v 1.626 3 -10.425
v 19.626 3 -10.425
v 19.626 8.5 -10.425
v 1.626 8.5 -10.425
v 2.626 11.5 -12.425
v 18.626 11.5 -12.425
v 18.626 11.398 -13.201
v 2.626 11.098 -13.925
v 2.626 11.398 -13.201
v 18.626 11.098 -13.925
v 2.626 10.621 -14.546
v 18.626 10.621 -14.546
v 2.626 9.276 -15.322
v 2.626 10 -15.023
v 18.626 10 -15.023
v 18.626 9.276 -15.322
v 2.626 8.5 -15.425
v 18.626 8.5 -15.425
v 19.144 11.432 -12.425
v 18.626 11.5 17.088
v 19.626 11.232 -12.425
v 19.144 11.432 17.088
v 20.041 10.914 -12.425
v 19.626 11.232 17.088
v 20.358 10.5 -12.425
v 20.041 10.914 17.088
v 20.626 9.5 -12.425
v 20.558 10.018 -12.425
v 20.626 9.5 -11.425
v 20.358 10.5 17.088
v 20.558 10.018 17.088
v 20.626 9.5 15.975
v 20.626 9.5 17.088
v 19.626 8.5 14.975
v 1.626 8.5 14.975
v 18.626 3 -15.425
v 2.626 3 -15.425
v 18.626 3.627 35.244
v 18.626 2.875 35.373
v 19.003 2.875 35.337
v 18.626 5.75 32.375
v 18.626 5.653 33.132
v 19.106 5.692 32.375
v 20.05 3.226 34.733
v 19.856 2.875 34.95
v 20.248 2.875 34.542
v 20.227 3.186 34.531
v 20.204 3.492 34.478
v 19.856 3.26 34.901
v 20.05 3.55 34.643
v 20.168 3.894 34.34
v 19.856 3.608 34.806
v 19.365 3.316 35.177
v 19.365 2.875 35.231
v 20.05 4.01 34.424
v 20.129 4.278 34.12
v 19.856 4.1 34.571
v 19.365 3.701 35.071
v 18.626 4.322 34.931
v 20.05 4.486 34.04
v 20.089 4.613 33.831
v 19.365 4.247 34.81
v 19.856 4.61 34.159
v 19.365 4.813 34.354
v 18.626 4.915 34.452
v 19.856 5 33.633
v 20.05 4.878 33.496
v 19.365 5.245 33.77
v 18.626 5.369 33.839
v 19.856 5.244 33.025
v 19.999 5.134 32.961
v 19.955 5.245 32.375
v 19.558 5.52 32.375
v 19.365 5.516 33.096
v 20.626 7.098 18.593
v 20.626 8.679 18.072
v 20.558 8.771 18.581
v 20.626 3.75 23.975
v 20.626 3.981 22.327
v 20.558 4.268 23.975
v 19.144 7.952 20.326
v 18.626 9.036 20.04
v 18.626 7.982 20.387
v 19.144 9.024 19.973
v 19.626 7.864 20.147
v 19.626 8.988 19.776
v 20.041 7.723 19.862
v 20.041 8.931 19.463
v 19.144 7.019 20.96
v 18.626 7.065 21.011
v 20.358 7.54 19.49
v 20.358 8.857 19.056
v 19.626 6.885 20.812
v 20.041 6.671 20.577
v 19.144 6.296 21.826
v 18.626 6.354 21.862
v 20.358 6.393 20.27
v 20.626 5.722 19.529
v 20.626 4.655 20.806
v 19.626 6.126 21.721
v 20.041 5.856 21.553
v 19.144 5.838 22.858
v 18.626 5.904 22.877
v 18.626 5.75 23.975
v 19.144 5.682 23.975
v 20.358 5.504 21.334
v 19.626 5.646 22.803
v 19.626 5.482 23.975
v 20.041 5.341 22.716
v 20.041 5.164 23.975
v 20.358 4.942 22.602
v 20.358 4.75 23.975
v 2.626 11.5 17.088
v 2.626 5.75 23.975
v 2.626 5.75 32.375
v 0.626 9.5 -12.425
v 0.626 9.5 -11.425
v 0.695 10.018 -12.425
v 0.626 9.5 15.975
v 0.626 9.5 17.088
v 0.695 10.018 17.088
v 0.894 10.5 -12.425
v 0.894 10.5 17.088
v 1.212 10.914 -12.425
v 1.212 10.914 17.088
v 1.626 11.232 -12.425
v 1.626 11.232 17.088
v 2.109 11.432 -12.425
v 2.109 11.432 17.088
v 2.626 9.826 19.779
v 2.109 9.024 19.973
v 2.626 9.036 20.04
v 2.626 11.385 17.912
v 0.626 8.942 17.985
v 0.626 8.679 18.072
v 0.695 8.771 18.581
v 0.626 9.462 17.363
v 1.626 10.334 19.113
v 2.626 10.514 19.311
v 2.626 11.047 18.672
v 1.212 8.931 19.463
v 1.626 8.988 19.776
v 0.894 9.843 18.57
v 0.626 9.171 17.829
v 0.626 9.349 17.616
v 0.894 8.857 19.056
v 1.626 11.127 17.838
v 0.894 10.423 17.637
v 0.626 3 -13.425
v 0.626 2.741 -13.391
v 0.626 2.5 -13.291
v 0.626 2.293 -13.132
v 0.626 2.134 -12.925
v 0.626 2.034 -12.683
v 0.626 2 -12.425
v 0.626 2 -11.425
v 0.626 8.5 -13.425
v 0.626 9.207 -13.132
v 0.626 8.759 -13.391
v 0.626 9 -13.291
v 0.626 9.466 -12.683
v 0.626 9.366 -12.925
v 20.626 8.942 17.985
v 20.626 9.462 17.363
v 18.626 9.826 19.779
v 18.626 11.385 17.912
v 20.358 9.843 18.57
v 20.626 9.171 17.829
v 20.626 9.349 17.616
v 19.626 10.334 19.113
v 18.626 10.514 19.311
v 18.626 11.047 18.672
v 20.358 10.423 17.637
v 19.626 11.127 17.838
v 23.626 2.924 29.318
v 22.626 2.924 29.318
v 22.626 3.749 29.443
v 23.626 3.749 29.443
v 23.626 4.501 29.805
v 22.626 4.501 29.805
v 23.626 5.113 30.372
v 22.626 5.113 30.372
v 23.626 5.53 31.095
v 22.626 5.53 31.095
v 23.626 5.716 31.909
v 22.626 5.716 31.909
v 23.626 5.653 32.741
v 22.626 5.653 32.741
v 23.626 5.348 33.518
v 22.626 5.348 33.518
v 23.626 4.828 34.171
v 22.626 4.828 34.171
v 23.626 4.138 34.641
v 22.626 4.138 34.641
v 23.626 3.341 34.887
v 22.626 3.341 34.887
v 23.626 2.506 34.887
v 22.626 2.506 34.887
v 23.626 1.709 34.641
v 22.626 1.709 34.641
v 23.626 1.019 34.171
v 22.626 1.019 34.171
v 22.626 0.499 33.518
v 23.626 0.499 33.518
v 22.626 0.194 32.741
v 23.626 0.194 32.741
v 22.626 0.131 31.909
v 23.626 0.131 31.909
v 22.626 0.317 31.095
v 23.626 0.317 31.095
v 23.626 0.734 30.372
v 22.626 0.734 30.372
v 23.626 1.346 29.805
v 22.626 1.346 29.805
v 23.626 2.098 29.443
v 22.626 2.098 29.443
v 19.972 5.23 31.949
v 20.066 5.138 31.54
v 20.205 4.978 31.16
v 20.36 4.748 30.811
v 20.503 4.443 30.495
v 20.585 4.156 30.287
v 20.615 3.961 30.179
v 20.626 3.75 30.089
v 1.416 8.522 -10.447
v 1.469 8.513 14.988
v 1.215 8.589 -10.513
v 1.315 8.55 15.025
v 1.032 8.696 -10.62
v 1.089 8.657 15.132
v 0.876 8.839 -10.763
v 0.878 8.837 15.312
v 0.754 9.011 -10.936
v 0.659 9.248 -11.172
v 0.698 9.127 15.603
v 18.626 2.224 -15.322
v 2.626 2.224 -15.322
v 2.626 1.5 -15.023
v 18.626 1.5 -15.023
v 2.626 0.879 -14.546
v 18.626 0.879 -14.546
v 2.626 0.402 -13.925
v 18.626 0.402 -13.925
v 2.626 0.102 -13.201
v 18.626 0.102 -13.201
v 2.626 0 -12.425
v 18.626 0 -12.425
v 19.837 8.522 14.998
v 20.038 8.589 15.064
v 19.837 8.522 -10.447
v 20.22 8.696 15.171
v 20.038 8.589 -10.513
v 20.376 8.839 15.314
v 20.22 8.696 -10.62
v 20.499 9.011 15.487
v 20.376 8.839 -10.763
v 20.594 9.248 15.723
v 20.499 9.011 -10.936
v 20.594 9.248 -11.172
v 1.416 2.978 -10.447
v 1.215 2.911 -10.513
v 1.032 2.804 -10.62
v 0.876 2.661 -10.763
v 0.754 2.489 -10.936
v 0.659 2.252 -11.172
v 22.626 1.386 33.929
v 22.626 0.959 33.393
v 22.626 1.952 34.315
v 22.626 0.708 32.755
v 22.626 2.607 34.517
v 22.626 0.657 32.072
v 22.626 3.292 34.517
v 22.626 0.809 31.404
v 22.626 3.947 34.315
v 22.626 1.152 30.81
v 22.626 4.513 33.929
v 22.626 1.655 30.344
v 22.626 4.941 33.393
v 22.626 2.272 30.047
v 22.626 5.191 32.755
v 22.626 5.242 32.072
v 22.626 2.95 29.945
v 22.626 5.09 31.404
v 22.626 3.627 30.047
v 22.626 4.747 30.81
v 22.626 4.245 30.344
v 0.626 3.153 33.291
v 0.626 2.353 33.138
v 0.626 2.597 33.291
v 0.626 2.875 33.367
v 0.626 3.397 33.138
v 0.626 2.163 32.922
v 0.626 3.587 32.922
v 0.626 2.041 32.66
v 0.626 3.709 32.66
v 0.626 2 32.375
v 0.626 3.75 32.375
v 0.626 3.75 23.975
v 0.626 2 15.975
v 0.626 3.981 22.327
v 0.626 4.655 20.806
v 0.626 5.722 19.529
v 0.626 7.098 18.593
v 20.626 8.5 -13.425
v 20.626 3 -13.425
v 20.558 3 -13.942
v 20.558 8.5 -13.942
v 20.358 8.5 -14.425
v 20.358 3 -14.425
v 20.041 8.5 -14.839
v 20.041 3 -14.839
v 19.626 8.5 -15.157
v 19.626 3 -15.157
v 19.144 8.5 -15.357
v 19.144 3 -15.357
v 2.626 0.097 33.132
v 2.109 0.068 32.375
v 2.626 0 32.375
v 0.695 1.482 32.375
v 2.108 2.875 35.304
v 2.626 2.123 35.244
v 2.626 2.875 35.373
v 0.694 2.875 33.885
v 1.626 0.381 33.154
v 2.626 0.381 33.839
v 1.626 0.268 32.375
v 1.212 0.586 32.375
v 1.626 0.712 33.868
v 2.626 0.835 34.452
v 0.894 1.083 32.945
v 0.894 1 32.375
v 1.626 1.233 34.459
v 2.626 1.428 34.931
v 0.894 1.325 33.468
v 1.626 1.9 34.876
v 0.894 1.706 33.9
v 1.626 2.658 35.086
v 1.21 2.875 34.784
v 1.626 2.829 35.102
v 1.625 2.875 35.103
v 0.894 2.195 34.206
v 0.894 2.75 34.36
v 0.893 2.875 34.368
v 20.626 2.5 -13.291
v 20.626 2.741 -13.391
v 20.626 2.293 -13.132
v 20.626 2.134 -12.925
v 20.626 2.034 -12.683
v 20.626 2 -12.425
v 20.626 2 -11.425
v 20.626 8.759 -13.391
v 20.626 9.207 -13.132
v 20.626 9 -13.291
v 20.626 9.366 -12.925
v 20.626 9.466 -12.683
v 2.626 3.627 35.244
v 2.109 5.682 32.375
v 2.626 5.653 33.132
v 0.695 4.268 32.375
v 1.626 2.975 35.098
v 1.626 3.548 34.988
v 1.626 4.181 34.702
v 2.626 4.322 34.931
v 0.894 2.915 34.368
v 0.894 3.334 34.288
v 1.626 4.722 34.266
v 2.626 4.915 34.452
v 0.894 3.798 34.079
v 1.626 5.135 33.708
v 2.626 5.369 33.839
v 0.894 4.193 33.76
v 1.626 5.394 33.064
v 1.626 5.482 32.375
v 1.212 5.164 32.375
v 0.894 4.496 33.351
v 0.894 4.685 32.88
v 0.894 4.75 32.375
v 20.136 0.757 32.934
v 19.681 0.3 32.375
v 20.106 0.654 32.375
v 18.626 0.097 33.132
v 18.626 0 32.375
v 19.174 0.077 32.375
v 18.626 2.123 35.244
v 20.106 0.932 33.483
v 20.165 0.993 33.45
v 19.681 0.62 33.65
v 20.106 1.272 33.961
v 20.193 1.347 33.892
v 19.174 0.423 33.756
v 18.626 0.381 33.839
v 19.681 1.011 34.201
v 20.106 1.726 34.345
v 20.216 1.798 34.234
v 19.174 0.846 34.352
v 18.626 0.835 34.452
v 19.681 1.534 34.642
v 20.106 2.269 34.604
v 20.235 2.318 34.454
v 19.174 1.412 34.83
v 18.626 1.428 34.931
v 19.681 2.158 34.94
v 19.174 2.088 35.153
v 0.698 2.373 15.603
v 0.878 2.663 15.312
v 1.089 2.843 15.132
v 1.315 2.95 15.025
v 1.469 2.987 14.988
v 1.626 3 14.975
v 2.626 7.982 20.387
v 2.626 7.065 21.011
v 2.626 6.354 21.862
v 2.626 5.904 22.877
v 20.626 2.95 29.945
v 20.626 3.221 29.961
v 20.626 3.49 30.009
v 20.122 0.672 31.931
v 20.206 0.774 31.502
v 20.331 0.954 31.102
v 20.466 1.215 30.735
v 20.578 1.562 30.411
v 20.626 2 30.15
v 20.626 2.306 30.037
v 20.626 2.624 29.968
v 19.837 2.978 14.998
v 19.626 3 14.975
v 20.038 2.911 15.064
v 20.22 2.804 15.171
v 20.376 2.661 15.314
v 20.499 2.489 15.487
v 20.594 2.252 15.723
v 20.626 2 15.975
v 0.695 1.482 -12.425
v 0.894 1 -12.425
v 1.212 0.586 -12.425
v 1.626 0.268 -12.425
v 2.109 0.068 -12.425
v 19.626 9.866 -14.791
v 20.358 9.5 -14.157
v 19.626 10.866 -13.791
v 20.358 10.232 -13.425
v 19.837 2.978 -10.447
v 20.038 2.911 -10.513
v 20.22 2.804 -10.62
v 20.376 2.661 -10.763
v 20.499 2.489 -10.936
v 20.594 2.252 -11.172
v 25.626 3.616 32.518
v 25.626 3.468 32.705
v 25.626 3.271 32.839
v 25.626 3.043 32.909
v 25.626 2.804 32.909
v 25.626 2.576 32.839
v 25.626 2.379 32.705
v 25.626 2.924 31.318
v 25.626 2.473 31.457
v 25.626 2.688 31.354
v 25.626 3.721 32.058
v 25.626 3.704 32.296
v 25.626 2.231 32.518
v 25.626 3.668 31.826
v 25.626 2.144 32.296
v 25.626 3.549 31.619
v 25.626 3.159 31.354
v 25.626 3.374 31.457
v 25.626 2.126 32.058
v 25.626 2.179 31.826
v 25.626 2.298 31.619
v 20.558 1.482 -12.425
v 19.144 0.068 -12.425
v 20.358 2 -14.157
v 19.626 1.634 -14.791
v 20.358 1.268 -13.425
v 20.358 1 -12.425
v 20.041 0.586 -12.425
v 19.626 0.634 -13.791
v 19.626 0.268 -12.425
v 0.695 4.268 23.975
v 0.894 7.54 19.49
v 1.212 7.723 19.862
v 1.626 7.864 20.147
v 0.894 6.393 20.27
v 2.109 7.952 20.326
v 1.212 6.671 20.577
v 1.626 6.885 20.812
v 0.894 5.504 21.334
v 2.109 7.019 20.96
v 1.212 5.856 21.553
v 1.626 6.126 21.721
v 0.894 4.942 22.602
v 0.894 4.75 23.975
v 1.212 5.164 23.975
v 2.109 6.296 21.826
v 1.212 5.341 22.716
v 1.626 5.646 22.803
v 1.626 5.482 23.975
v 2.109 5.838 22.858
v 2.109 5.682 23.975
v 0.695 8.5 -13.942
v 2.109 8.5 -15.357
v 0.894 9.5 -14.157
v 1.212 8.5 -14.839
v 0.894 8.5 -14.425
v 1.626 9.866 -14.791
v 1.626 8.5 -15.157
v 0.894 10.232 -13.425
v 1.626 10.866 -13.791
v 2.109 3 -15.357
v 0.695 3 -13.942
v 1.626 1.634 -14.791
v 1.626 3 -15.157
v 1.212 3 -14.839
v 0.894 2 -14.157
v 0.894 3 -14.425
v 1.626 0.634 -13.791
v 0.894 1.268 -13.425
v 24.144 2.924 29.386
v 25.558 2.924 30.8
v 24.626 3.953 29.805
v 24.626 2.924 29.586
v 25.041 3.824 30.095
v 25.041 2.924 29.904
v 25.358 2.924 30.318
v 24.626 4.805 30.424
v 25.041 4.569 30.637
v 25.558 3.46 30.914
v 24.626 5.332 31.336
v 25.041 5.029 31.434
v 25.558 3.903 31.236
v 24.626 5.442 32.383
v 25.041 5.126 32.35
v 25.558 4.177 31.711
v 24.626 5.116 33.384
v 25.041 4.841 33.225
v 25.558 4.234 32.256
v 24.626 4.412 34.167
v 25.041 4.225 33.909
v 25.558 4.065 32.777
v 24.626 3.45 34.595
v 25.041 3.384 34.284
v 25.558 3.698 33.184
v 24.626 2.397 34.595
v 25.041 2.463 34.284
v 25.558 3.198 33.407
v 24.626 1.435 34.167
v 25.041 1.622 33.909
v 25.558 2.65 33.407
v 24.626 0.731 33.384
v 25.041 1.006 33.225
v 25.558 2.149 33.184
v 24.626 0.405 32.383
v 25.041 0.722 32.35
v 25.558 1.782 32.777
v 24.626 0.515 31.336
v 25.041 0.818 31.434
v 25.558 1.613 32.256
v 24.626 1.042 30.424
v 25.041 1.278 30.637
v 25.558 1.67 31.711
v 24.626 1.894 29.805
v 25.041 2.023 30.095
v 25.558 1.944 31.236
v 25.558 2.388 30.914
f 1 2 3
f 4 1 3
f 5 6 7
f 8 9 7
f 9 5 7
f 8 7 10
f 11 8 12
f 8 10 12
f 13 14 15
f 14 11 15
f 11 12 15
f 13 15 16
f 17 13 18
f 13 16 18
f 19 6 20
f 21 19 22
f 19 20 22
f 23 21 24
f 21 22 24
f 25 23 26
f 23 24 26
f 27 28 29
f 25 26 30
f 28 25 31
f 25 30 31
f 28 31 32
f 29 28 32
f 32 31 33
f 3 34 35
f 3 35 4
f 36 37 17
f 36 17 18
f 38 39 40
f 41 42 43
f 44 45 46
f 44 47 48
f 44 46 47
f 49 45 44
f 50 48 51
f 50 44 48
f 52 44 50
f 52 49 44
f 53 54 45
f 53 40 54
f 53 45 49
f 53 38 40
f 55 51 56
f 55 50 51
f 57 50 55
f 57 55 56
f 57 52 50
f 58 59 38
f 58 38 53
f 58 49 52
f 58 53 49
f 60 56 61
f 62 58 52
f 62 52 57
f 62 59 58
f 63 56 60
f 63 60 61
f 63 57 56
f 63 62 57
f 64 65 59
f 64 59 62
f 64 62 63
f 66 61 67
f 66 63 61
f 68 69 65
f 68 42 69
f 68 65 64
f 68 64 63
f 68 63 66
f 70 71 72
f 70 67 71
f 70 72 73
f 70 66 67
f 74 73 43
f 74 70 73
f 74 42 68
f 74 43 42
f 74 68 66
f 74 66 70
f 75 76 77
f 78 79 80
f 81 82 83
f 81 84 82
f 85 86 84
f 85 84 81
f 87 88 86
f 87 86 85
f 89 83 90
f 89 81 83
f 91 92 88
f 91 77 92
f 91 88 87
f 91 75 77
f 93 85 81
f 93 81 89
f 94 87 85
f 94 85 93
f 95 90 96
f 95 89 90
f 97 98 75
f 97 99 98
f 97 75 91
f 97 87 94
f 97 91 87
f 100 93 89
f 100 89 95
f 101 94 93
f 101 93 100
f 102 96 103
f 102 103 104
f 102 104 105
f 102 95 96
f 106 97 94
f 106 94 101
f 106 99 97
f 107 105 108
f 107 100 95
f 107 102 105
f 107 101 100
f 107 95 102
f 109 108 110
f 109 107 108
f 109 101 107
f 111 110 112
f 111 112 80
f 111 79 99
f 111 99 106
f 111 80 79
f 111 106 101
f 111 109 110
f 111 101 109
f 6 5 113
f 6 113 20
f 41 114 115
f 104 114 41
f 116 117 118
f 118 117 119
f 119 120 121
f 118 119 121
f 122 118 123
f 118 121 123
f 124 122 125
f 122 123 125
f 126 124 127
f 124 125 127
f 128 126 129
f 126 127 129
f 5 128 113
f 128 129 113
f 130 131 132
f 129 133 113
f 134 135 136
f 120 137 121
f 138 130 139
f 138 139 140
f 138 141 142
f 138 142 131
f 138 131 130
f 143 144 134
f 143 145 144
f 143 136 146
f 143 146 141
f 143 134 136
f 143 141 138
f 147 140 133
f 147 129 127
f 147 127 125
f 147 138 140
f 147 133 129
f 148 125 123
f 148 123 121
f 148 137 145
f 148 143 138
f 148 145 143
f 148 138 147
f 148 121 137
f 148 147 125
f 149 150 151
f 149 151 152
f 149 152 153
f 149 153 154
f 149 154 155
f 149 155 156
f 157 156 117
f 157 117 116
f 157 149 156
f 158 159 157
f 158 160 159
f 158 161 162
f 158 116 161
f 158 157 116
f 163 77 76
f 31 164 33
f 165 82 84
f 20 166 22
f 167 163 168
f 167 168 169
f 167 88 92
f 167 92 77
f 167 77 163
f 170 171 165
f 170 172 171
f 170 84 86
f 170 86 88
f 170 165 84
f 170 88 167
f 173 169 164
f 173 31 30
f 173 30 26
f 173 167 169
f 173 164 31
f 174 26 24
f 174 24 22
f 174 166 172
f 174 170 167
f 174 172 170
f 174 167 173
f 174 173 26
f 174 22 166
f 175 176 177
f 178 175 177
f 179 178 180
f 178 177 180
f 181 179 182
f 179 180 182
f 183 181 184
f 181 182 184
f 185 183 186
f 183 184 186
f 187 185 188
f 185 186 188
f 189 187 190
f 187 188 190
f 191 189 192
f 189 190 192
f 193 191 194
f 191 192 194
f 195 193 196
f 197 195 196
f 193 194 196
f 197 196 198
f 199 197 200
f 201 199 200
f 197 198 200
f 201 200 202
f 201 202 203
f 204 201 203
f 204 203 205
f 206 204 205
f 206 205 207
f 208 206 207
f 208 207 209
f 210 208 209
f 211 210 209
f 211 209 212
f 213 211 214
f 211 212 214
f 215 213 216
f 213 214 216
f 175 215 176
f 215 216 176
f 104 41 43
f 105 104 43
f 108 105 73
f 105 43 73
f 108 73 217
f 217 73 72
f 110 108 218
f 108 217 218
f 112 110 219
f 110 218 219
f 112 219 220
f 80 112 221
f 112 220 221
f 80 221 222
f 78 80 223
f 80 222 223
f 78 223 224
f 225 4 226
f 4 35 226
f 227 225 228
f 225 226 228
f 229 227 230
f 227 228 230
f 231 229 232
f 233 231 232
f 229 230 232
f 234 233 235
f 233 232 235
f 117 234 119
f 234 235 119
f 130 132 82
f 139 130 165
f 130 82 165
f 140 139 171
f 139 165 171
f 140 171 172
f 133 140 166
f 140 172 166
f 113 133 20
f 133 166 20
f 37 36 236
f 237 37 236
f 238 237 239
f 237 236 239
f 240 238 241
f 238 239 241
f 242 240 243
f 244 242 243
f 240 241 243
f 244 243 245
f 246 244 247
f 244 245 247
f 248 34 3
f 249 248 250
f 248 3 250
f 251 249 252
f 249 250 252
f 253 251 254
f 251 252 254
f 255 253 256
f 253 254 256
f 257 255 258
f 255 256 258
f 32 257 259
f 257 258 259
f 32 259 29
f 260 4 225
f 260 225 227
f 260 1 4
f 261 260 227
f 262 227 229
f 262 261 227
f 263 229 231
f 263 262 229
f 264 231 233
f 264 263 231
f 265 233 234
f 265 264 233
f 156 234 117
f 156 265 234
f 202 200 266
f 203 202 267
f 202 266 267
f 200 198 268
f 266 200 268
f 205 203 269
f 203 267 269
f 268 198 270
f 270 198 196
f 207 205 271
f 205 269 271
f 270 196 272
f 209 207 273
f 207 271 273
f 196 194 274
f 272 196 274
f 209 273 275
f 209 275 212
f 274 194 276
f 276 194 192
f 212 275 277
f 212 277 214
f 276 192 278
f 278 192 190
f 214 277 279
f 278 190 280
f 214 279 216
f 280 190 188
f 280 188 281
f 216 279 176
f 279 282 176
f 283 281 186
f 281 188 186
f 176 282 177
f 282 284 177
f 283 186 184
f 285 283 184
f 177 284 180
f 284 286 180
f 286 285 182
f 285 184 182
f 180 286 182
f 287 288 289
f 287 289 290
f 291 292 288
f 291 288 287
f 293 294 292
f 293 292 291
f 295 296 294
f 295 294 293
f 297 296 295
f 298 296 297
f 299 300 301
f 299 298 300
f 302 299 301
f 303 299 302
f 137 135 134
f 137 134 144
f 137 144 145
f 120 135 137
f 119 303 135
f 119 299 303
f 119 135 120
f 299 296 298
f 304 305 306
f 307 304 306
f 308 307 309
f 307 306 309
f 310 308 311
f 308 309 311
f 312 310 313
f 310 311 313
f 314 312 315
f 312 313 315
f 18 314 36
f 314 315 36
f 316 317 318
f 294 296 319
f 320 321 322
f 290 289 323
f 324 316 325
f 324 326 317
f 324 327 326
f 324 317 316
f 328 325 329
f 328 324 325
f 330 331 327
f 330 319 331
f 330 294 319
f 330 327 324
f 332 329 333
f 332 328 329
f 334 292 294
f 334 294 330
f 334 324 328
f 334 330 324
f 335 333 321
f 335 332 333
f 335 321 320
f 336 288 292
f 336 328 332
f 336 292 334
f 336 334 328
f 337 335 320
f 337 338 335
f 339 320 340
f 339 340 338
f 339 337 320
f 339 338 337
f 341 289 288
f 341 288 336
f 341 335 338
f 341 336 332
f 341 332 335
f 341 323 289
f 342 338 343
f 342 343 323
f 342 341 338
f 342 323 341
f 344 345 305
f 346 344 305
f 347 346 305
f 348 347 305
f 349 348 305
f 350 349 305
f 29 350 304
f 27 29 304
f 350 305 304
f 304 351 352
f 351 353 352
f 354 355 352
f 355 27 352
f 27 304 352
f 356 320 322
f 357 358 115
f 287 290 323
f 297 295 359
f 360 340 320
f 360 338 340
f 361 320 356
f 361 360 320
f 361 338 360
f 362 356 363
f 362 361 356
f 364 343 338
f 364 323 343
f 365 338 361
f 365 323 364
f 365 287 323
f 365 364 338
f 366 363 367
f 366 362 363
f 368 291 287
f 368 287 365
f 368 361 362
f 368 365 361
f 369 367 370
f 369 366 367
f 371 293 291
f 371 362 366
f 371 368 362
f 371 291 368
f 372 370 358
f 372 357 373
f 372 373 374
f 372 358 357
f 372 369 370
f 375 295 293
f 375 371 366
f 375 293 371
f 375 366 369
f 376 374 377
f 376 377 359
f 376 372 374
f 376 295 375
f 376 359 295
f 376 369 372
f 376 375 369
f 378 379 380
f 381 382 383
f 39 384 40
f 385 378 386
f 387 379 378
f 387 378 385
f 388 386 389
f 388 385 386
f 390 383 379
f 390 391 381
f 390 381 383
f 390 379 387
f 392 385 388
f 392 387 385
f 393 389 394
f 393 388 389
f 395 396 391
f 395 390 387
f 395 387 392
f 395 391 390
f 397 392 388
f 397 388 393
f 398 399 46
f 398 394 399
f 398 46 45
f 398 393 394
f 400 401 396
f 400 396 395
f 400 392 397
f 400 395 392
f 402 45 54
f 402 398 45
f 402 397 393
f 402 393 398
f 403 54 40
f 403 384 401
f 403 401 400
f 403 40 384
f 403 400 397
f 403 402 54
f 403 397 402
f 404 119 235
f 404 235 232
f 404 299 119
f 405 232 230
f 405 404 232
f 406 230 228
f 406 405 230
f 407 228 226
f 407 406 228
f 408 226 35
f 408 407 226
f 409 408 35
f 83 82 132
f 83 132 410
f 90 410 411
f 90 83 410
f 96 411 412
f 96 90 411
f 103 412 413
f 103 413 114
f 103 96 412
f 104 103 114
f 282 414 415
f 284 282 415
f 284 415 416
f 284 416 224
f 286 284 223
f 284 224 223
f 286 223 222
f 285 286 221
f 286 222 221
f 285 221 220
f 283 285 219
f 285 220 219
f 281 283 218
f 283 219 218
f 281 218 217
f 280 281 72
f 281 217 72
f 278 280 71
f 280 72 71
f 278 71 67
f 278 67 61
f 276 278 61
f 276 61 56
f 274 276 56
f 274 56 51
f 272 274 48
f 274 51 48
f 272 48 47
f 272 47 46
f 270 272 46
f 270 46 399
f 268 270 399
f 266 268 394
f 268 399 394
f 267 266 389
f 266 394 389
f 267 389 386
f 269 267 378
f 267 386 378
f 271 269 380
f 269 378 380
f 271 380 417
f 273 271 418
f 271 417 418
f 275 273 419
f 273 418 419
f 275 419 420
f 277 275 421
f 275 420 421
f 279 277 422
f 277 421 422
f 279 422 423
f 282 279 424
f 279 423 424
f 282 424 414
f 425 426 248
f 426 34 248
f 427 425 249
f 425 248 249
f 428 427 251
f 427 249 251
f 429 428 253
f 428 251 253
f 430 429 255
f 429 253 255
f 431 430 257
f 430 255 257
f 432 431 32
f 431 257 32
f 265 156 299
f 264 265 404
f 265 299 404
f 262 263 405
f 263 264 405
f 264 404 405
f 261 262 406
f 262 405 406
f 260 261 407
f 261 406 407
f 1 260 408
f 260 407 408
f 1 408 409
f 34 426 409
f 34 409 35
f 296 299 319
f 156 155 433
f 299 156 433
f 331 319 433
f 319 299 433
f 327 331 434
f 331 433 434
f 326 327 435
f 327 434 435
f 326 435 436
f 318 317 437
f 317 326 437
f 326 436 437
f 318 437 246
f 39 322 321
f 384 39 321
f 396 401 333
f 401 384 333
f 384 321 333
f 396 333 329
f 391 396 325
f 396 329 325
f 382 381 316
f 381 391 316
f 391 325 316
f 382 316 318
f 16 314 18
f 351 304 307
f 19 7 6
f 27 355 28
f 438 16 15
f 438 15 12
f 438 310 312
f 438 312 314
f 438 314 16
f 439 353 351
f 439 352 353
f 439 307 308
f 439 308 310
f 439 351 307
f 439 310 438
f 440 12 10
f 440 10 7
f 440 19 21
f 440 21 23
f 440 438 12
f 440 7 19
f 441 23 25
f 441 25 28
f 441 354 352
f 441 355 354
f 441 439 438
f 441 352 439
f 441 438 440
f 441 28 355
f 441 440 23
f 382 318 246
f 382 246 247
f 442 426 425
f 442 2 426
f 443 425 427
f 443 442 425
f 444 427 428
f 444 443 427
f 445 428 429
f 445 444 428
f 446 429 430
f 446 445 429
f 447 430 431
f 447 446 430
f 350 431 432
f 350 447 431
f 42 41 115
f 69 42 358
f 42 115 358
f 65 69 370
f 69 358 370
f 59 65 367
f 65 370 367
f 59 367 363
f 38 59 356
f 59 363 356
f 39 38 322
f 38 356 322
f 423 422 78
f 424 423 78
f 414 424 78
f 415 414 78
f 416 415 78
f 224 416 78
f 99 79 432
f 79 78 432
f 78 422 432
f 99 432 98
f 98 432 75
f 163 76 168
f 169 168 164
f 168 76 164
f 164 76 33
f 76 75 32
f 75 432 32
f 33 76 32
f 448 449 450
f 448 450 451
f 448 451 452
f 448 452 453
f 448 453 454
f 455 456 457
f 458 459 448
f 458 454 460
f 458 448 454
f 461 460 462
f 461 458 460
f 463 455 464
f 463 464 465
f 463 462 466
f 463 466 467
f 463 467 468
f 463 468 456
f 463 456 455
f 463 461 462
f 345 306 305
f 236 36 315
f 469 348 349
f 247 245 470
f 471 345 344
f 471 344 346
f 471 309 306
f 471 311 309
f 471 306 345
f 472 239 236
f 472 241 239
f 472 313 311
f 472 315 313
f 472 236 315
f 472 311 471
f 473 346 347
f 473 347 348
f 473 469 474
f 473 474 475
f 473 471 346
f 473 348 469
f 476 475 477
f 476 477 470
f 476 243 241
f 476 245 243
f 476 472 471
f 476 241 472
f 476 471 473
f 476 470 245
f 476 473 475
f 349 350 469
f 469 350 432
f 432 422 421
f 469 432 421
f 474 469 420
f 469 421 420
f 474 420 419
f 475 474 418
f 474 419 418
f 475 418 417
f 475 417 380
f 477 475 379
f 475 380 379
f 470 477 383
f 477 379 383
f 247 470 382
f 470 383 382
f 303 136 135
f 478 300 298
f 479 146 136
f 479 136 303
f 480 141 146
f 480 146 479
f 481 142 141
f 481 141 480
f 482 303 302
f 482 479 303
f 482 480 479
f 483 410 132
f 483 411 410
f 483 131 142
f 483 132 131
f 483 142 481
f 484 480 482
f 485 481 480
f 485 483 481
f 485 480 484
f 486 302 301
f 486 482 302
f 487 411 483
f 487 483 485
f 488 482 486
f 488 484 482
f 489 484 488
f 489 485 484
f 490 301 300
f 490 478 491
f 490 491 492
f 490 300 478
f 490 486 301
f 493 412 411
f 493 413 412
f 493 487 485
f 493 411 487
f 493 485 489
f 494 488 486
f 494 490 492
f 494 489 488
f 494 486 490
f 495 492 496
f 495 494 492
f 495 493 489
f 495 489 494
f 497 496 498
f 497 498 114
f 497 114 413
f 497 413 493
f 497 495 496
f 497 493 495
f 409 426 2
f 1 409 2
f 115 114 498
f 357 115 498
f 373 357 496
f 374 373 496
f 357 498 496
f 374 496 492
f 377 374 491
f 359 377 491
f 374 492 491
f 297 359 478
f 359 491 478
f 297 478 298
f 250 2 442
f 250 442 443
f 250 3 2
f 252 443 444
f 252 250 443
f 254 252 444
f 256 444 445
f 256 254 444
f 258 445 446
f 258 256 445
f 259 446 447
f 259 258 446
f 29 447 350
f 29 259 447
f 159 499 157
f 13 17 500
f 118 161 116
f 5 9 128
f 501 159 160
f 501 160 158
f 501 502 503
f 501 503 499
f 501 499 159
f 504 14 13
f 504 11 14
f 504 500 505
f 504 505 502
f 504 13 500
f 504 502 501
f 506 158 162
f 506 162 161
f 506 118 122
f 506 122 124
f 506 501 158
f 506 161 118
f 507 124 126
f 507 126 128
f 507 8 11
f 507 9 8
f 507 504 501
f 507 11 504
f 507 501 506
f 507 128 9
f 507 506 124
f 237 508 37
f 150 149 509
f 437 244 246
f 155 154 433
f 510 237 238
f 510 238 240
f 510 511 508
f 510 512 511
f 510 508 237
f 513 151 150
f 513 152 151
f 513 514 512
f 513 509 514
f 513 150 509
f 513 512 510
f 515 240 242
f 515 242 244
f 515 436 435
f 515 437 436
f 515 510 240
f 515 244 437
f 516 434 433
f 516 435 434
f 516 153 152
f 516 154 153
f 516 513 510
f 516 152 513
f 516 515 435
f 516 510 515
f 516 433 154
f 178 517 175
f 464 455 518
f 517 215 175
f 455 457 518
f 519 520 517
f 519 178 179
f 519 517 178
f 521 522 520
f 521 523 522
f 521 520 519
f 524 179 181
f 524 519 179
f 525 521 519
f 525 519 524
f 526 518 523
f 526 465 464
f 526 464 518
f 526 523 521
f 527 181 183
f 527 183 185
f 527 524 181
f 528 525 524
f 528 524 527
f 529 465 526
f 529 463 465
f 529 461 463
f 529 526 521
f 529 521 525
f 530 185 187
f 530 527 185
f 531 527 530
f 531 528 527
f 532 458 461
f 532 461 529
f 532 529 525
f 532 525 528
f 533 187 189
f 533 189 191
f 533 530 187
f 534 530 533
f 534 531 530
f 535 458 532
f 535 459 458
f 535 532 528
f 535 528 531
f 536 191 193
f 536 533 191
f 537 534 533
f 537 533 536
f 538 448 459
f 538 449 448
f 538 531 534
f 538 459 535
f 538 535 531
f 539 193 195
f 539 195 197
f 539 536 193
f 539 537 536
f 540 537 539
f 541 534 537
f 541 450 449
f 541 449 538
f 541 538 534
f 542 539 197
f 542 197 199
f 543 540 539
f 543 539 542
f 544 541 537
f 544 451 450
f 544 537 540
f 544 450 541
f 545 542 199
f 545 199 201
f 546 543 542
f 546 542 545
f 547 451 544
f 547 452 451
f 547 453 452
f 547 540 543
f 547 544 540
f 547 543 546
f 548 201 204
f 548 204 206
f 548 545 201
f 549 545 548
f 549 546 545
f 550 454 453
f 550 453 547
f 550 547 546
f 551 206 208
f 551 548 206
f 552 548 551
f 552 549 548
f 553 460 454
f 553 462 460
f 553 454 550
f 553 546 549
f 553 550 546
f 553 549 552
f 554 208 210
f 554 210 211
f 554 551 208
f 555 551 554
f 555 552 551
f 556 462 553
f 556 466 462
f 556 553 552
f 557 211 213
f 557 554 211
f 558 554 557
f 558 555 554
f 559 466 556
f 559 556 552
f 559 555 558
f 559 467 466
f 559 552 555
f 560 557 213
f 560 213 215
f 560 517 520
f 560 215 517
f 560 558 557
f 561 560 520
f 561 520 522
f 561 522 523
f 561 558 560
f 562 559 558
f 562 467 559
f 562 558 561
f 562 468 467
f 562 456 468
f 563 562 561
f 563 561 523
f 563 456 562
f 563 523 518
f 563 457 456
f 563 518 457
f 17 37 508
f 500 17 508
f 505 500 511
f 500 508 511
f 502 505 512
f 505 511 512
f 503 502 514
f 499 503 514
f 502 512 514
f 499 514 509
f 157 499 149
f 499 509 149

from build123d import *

# Parameters (mm, degrees)
SKETCH1_W           = 20
SKETCH1_H           = 25.4
BOSS_EXTRUDE1_DEPTH = 11.5
SKETCH1_3_W         = 20
SKETCH1_3_H         = 25.4
BOSS_EXTRUDE2_DEPTH = 5.75
SKETCH3_W           = 20
SKETCH3_H           = 5.75
BOSS_EXTRUDE3_DEPTH = 10
SKETCH4_W           = 25.4
SKETCH4_H           = 5.5
CUT_EXTRUDE1_DEPTH  = 43.233437778
FILLET1_R           = 1
FILLET2_R           = 1
FILLET3_R           = 3
FILLET4_R           = 3
FILLET5_R           = 4
FILLET6_R           = 3
SKETCH6_R           = 2.299110901
BOSS_EXTRUDE4_DEPTH = 2
FILLET7_R           = 3
SKETCH8_R           = 2.8
BOSS_EXTRUDE6_DEPTH = 3
FILLET9_R           = 2
FILLET10_R          = 2
FILLET11_R          = 2


with BuildPart() as part:
    # Sketch1 → Boss-Extrude1 (new body)
    with BuildSketch(Plane(origin=(0, 0, 0), x_dir=(1, 0, 0), z_dir=(0, 1, 0))):
        with Locations((10.626362144, 2.72467998)):
            Rectangle(SKETCH1_W, SKETCH1_H)
    extrude(amount=BOSS_EXTRUDE1_DEPTH)

    # Sketch1<3> → Boss-Extrude2 (add)
    with BuildSketch(Plane(origin=(0, 0, 0), x_dir=(1, 0, 0), z_dir=(0, 1, 0))):
        with Locations((10.626362144, -22.67532002)):
            Rectangle(SKETCH1_3_W, SKETCH1_3_H)
    extrude(amount=BOSS_EXTRUDE2_DEPTH)

    # Sketch3 → Boss-Extrude3 (add)
    with BuildSketch(Plane.XY.offset(9.97532002)):
        with Locations((10.626362144, 8.625)):
            Rectangle(SKETCH3_W, SKETCH3_H)
    extrude(amount=BOSS_EXTRUDE3_DEPTH)

    # Sketch4 → Cut-Extrude1 (cut, through all)
    with BuildSketch(Plane(origin=(20.626362144, 0, 0), x_dir=(0, 0, -1), z_dir=(1, 0, 0))):
        with Locations((-2.27532002, 5.75)):
            Rectangle(SKETCH4_W, SKETCH4_H)
    extrude(amount=-CUT_EXTRUDE1_DEPTH, mode=Mode.SUBTRACT)

    # Fillet1
    fillet1_edges = [part.edges().sort_by_distance(p)[0] for p in [
        (20.626362144, 5.75, 14.97532002),
        (20.626362144, 3, 2.27532002),
        (20.626362144, 5.75, -10.42467998),
        (20.626362144, 8.5, 2.27532002),
    ]]
    fillet(fillet1_edges, radius=FILLET1_R)

    # Fillet2
    fillet2_edges = [part.edges().sort_by_distance(p)[0] for p in [
        (0.626362144, 5.75, 14.97532002),
        (0.626362144, 8.5, 2.27532002),
        (0.626362144, 5.75, -10.42467998),
        (0.626362144, 3, 2.27532002),
    ]]
    fillet(fillet2_edges, radius=FILLET2_R)

    # Fillet3
    fillet3_edges = [part.edges().sort_by_distance(p)[0] for p in [
        (10.626362144, 11.5, -15.42467998),
    ]]
    fillet(fillet3_edges, radius=FILLET3_R)

    # Fillet4
    fillet4_edges = [part.edges().sort_by_distance(p)[0] for p in [
        (10.626362144, 0, -15.42467998),
    ]]
    fillet(fillet4_edges, radius=FILLET4_R)

    # Fillet5
    fillet5_edges = [part.edges().sort_by_distance(p)[0] for p in [
        (10.626362144, 5.75, 19.97532002),
    ]]
    fillet(fillet5_edges, radius=FILLET5_R)

    # Fillet6
    fillet6_edges = [part.edges().sort_by_distance(p)[0] for p in [
        (10.626362144, 11.5, 19.97532002),
    ]]
    fillet(fillet6_edges, radius=FILLET6_R)

    # Sketch6 → Boss-Extrude4 (add)
    with BuildSketch(Plane(origin=(20.626362144, 0, 0), x_dir=(0, 0, -1), z_dir=(1, 0, 0))):
        with Locations((-32.243815698, 2.949635855)):
            Circle(SKETCH6_R)
    extrude(amount=BOSS_EXTRUDE4_DEPTH)

    # Fillet7
    # the kernel refuses this fillet: 3 mm, written as the material it takes off along each edge
    with BuildSketch(Plane(origin=(-6.873637856, 0, 35.37532002), x_dir=(0, 1, 0), z_dir=(1, 0, 0)), Plane(origin=(-6.873637856, 5.75, 35.37532002), x_dir=(0, 0, -1), z_dir=(1, 0, 0))) as fillet7_piece_1:
        with BuildLine():
            CenterArc((FILLET7_R, -FILLET7_R), FILLET7_R, 90, 90)
            Line((0, -FILLET7_R), (0, 0))
            Line((0, 0), (FILLET7_R, 0))
        make_face()
    extrude(amount=35, mode=Mode.SUBTRACT)

    # Sketch8 → Boss-Extrude6 (add)
    with BuildSketch(Plane(origin=(22.626362144, 0, 0), x_dir=(0, 0, -1), z_dir=(1, 0, 0))):
        with Locations((-32.118132116, 2.923606681)):
            Circle(SKETCH8_R)
    extrude(amount=BOSS_EXTRUDE6_DEPTH)

    # Fillet9
    fillet9_edges = [part.edges().sort_by_distance(p)[0] for p in [
        (25.626362144, 2.923606681, 34.918132116),
    ]]
    fillet(fillet9_edges, radius=FILLET9_R)

    # Fillet10
    # the kernel refuses this fillet: 2 mm, written as the material it takes off along each edge
    with BuildSketch(Plane(origin=(0.626362144, 9.75, 23.97532002), x_dir=(0, -0.17857142857142888, -0.9839269509968508), z_dir=(0, 0.9839269509968508, -0.17857142857142888))) as fillet10_piece_1:
        with BuildLine():
            CenterArc((4 + FILLET10_R, -FILLET10_R), FILLET10_R, 90, 90)
            Line((4 + FILLET10_R, 0), (4, 0))
            Line((4, 0), (4, -FILLET10_R))
        make_face()
    revolve(axis=Axis((0.626362144, 9.75, 23.97532002), (-1, 0, 0)), revolution_arc=79.713439389, mode=Mode.SUBTRACT)
    with BuildSketch(Plane(origin=(0.626362144, 8.500000013, 17.087831374), x_dir=(0, 0.17857142509559704, 0.9839269516276742), z_dir=(0, -0.9839269516276742, 0.17857142509559704))) as fillet10_piece_2:
        with BuildLine():
            CenterArc((2.999999987 - FILLET10_R * 1.00000000192, -FILLET10_R), FILLET10_R, 360, 90)
            Line((2.999999987 - FILLET10_R * 1.00000000192, 0), (2.999999987, 0))
            Line((2.999999987, 0), (2.999999987 - FILLET10_R * 1.92114524289e-09, -FILLET10_R))
        make_face()
    revolve(axis=Axis((0.626362144, 8.500000013, 17.087831374), (-1, 0, 0)), revolution_arc=79.713439793, mode=Mode.SUBTRACT)
    with BuildSketch(Plane(origin=(0.626362144, 2.75, 32.37532002), x_dir=(0, -0.9984974283407907, -0.05479859119382269), z_dir=(0, 0.05479859119382269, -0.9984974283407907))) as fillet10_piece_3:
        with BuildLine():
            CenterArc((3 - FILLET10_R, -FILLET10_R), FILLET10_R, 0, 90)
            Line((3 - FILLET10_R, 0), (3, 0))
            Line((3, 0), (3, -FILLET10_R))
        make_face()
    revolve(axis=Axis((0.626362144, 2.75, 32.37532002), (-1, 0, 0)), revolution_arc=183.1413015, mode=Mode.SUBTRACT)
    with BuildSketch(Plane(origin=(0.626362144, 3, 32.37532002), x_dir=(0, -1, 0), z_dir=(0, 0, -1))) as fillet10_piece_4:
        with BuildLine():
            CenterArc((3 - FILLET10_R, -FILLET10_R), FILLET10_R, 0, 90)
            Line((3 - FILLET10_R, 0), (3, 0))
            Line((3, 0), (3, -FILLET10_R))
        make_face()
    revolve(axis=Axis((0.626362144, 3, 32.37532002), (-1, 0, 0)), revolution_arc=183.1413015, mode=Mode.SUBTRACT)
    with BuildSketch(Plane(origin=(0.626362144, 3, -15.42467998), x_dir=(1, 0, 0), z_dir=(0, 1, 0))) as fillet10_piece_5:
        with BuildLine():
            CenterArc((FILLET10_R, -FILLET10_R), FILLET10_R, 90, 90)
            Line((0, -FILLET10_R), (0, 0))
            Line((0, 0), (FILLET10_R, 0))
        make_face()
    extrude(amount=5.5, mode=Mode.SUBTRACT)
    with BuildSketch(Plane(origin=(0.626362144, 11.5, 17.087831364), x_dir=(1, 0, 0), z_dir=(0, 0, -1))) as fillet10_piece_6:
        with BuildLine():
            CenterArc((FILLET10_R, FILLET10_R), FILLET10_R, 180, 90)
            Line((0, FILLET10_R), (0, 0))
            Line((0, 0), (FILLET10_R, 0))
        make_face()
    extrude(amount=29.512511343, mode=Mode.SUBTRACT)
    with BuildSketch(Plane(origin=(0.626362144, 8.5, -12.42467998), x_dir=(0, 0, -1), z_dir=(0, -1, 0))) as fillet10_piece_7:
        with BuildLine():
            CenterArc((3 - FILLET10_R, FILLET10_R), FILLET10_R, 270, 90)
            Line((3 - FILLET10_R, 0), (3, 0))
            Line((3, 0), (3, FILLET10_R))
        make_face()
    revolve(axis=Axis((0.626362144, 8.5, -12.42467998), (1, 0, 0)), revolution_arc=90, mode=Mode.SUBTRACT)
    with BuildSketch(Plane(origin=(0.626362144, 0, -12.42467998), x_dir=(1, 0, 0), z_dir=(0, 0, 1))) as fillet10_piece_8:
        with BuildLine():
            CenterArc((FILLET10_R, FILLET10_R), FILLET10_R, 180, 90)
            Line((0, FILLET10_R), (0, 0))
            Line((0, 0), (FILLET10_R, 0))
        make_face()
    extrude(amount=44.8, mode=Mode.SUBTRACT)
    with BuildSketch(Plane(origin=(0.626362144, 3, -12.42467998), x_dir=(0, 0, -1), z_dir=(0, 1, 0))) as fillet10_piece_9:
        with BuildLine():
            CenterArc((3 - FILLET10_R, -FILLET10_R), FILLET10_R, 0, 90)
            Line((3 - FILLET10_R, 0), (3, 0))
            Line((3, 0), (3, -FILLET10_R))
        make_face()
    revolve(axis=Axis((0.626362144, 3, -12.42467998), (-1, 0, 0)), revolution_arc=90, mode=Mode.SUBTRACT)
    with BuildSketch(Plane(origin=(0.626362144, 5.75, 23.97532002), x_dir=(1, 0, 0), z_dir=(0, 0, 1))) as fillet10_piece_10:
        with BuildLine():
            CenterArc((FILLET10_R, -FILLET10_R), FILLET10_R, 90, 90)
            Line((0, -FILLET10_R), (0, 0))
            Line((0, 0), (FILLET10_R, 0))
        make_face()
    extrude(amount=8.4, mode=Mode.SUBTRACT)

    # Fillet11
    # the kernel refuses this fillet: 2 mm, written as the material it takes off along each edge
    with BuildSketch(Plane(origin=(20.626362144, 0, 32.37532002), x_dir=(0, 1, 0), z_dir=(0, 0, -1))) as fillet11_piece_1_section:
        with BuildLine():
            CenterArc((FILLET11_R, -FILLET11_R), FILLET11_R, 90, 90)
            Line((0, -FILLET11_R), (0, 0))
            Line((0, 0), (FILLET11_R, 0))
        make_face()
    fillet11_piece_1 = extrude(amount=44.8, mode=Mode.PRIVATE)
    fillet11_piece_1 = fillet11_piece_1 - Plane(origin=(20.626362144, 2.949635855, 32.243815698), x_dir=(0, 0, -1), z_dir=(-1, 0, 0)) * Cylinder(2.299110901, 98, mode=Mode.PRIVATE)
    add(fillet11_piece_1, mode=Mode.SUBTRACT)
    with BuildSketch(Plane(origin=(20.626362144, 3, -12.42467998), x_dir=(0, 0, -1), z_dir=(0, 1, 0))) as fillet11_piece_2:
        with BuildLine():
            CenterArc((3 - FILLET11_R, FILLET11_R), FILLET11_R, 270, 90)
            Line((3, FILLET11_R), (3, 0))
            Line((3, 0), (3 - FILLET11_R, 0))
        make_face()
    revolve(axis=Axis((20.626362144, 3, -12.42467998), (-1, 0, 0)), revolution_arc=90, mode=Mode.SUBTRACT)
    with BuildSketch(Plane(origin=(20.626362144, 3, -15.42467998), x_dir=(0, 0, 1), z_dir=(0, 1, 0))) as fillet11_piece_3:
        with BuildLine():
            CenterArc((FILLET11_R, -FILLET11_R), FILLET11_R, 90, 90)
            Line((0, -FILLET11_R), (0, 0))
            Line((0, 0), (FILLET11_R, 0))
        make_face()
    extrude(amount=5.5, mode=Mode.SUBTRACT)
    with BuildSketch(Plane(origin=(20.626362144, 8.5, -12.42467998), x_dir=(0, 0, -1), z_dir=(0, -1, 0))) as fillet11_piece_4:
        with BuildLine():
            CenterArc((3 - FILLET11_R, -FILLET11_R), FILLET11_R, 0, 90)
            Line((3, -FILLET11_R), (3, 0))
            Line((3, 0), (3 - FILLET11_R, 0))
        make_face()
    revolve(axis=Axis((20.626362144, 8.5, -12.42467998), (1, 0, 0)), revolution_arc=90, mode=Mode.SUBTRACT)
    with BuildSketch(Plane(origin=(20.626362144, 5.75, 32.37532002), x_dir=(0, -1, 0), z_dir=(0, 0, -1))) as fillet11_piece_5_section:
        with BuildLine():
            CenterArc((FILLET11_R, FILLET11_R), FILLET11_R, 180, 90)
            Line((0, FILLET11_R), (0, 0))
            Line((0, 0), (FILLET11_R, 0))
        make_face()
    fillet11_piece_5 = extrude(amount=8.4, mode=Mode.PRIVATE)
    fillet11_piece_5 = fillet11_piece_5 - Plane(origin=(20.626362144, 2.949635855, 32.243815698), x_dir=(0, 0, -1), z_dir=(-1, 0, 0)) * Cylinder(2.299110901, 25, mode=Mode.PRIVATE)
    add(fillet11_piece_5, mode=Mode.SUBTRACT)
    with BuildSketch(Plane(origin=(20.626362144, 9.75, 23.97532002), x_dir=(0, -0.17857142857142888, -0.9839269509968508), z_dir=(0, 0.9839269509968508, -0.17857142857142888))) as fillet11_piece_6:
        with BuildLine():
            CenterArc((4 + FILLET11_R, FILLET11_R), FILLET11_R, 180, 90)
            Line((4, FILLET11_R), (4, 0))
            Line((4, 0), (4 + FILLET11_R, 0))
        make_face()
    revolve(axis=Axis((20.626362144, 9.75, 23.97532002), (-1, 0, 0)), revolution_arc=79.713439389, mode=Mode.SUBTRACT)
    with BuildSketch(Plane(origin=(20.626362144, 8.500000013, 17.087831374), x_dir=(0, 0.178571425095601, 0.9839269516276735), z_dir=(0, -0.9839269516276735, 0.178571425095601))) as fillet11_piece_7:
        with BuildLine():
            CenterArc((2.999999987 - FILLET11_R * 1.00000000192, FILLET11_R), FILLET11_R, 270, 90)
            Line((2.999999987 - FILLET11_R * 1.92114324449e-09, FILLET11_R), (2.999999987, 0))
            Line((2.999999987, 0), (2.999999987 - FILLET11_R * 1.00000000192, 0))
        make_face()
    revolve(axis=Axis((20.626362144, 8.500000013, 17.087831374), (-1, 0, 0)), revolution_arc=79.713439793, mode=Mode.SUBTRACT)
    with BuildSketch(Plane(origin=(20.626362144, 11.5, 17.087831364), x_dir=(0, -1, 0), z_dir=(0, 0, -1))) as fillet11_piece_8:
        with BuildLine():
            CenterArc((FILLET11_R, FILLET11_R), FILLET11_R, 180, 90)
            Line((0, FILLET11_R), (0, 0))
            Line((0, 0), (FILLET11_R, 0))
        make_face()
    extrude(amount=29.512511343, mode=Mode.SUBTRACT)
    with BuildSketch(Plane(origin=(20.626362144, 2.75, 32.37532002), x_dir=(0, -0.9984974283407908, -0.05479859119382033), z_dir=(0, 0.05479859119382033, -0.9984974283407908))) as fillet11_piece_9_section:
        with BuildLine():
            CenterArc((3 - FILLET11_R, FILLET11_R), FILLET11_R, 270, 90)
            Line((3, FILLET11_R), (3, 0))
            Line((3, 0), (3 - FILLET11_R, 0))
        make_face()
    fillet11_piece_9 = revolve(axis=Axis((20.626362144, 2.75, 32.37532002), (-1, 0, 0)), revolution_arc=183.1413015, mode=Mode.PRIVATE)
    fillet11_piece_9 = fillet11_piece_9 - Plane(origin=(20.626362144, 2.949635855, 32.243815698), x_dir=(0, 0, -1), z_dir=(-1, 0, 0)) * Cylinder(2.299110901, 13, mode=Mode.PRIVATE)
    add(fillet11_piece_9, mode=Mode.SUBTRACT)
    with BuildSketch(Plane(origin=(20.626362144, 3, 32.37532002), x_dir=(0, -1, 0), z_dir=(0, 0, -1))) as fillet11_piece_10_section:
        with BuildLine():
            CenterArc((3 - FILLET11_R, FILLET11_R), FILLET11_R, 270, 90)
            Line((3, FILLET11_R), (3, 0))
            Line((3, 0), (3 - FILLET11_R, 0))
        make_face()
    fillet11_piece_10 = revolve(axis=Axis((20.626362144, 3, 32.37532002), (-1, 0, 0)), revolution_arc=183.1413015, mode=Mode.PRIVATE)
    fillet11_piece_10 = fillet11_piece_10 - Plane(origin=(20.626362144, 2.949635855, 32.243815698), x_dir=(0, 0, -1), z_dir=(-1, 0, 0)) * Cylinder(2.299110901, 12, mode=Mode.PRIVATE)
    add(fillet11_piece_10, mode=Mode.SUBTRACT)


solid = part.part
